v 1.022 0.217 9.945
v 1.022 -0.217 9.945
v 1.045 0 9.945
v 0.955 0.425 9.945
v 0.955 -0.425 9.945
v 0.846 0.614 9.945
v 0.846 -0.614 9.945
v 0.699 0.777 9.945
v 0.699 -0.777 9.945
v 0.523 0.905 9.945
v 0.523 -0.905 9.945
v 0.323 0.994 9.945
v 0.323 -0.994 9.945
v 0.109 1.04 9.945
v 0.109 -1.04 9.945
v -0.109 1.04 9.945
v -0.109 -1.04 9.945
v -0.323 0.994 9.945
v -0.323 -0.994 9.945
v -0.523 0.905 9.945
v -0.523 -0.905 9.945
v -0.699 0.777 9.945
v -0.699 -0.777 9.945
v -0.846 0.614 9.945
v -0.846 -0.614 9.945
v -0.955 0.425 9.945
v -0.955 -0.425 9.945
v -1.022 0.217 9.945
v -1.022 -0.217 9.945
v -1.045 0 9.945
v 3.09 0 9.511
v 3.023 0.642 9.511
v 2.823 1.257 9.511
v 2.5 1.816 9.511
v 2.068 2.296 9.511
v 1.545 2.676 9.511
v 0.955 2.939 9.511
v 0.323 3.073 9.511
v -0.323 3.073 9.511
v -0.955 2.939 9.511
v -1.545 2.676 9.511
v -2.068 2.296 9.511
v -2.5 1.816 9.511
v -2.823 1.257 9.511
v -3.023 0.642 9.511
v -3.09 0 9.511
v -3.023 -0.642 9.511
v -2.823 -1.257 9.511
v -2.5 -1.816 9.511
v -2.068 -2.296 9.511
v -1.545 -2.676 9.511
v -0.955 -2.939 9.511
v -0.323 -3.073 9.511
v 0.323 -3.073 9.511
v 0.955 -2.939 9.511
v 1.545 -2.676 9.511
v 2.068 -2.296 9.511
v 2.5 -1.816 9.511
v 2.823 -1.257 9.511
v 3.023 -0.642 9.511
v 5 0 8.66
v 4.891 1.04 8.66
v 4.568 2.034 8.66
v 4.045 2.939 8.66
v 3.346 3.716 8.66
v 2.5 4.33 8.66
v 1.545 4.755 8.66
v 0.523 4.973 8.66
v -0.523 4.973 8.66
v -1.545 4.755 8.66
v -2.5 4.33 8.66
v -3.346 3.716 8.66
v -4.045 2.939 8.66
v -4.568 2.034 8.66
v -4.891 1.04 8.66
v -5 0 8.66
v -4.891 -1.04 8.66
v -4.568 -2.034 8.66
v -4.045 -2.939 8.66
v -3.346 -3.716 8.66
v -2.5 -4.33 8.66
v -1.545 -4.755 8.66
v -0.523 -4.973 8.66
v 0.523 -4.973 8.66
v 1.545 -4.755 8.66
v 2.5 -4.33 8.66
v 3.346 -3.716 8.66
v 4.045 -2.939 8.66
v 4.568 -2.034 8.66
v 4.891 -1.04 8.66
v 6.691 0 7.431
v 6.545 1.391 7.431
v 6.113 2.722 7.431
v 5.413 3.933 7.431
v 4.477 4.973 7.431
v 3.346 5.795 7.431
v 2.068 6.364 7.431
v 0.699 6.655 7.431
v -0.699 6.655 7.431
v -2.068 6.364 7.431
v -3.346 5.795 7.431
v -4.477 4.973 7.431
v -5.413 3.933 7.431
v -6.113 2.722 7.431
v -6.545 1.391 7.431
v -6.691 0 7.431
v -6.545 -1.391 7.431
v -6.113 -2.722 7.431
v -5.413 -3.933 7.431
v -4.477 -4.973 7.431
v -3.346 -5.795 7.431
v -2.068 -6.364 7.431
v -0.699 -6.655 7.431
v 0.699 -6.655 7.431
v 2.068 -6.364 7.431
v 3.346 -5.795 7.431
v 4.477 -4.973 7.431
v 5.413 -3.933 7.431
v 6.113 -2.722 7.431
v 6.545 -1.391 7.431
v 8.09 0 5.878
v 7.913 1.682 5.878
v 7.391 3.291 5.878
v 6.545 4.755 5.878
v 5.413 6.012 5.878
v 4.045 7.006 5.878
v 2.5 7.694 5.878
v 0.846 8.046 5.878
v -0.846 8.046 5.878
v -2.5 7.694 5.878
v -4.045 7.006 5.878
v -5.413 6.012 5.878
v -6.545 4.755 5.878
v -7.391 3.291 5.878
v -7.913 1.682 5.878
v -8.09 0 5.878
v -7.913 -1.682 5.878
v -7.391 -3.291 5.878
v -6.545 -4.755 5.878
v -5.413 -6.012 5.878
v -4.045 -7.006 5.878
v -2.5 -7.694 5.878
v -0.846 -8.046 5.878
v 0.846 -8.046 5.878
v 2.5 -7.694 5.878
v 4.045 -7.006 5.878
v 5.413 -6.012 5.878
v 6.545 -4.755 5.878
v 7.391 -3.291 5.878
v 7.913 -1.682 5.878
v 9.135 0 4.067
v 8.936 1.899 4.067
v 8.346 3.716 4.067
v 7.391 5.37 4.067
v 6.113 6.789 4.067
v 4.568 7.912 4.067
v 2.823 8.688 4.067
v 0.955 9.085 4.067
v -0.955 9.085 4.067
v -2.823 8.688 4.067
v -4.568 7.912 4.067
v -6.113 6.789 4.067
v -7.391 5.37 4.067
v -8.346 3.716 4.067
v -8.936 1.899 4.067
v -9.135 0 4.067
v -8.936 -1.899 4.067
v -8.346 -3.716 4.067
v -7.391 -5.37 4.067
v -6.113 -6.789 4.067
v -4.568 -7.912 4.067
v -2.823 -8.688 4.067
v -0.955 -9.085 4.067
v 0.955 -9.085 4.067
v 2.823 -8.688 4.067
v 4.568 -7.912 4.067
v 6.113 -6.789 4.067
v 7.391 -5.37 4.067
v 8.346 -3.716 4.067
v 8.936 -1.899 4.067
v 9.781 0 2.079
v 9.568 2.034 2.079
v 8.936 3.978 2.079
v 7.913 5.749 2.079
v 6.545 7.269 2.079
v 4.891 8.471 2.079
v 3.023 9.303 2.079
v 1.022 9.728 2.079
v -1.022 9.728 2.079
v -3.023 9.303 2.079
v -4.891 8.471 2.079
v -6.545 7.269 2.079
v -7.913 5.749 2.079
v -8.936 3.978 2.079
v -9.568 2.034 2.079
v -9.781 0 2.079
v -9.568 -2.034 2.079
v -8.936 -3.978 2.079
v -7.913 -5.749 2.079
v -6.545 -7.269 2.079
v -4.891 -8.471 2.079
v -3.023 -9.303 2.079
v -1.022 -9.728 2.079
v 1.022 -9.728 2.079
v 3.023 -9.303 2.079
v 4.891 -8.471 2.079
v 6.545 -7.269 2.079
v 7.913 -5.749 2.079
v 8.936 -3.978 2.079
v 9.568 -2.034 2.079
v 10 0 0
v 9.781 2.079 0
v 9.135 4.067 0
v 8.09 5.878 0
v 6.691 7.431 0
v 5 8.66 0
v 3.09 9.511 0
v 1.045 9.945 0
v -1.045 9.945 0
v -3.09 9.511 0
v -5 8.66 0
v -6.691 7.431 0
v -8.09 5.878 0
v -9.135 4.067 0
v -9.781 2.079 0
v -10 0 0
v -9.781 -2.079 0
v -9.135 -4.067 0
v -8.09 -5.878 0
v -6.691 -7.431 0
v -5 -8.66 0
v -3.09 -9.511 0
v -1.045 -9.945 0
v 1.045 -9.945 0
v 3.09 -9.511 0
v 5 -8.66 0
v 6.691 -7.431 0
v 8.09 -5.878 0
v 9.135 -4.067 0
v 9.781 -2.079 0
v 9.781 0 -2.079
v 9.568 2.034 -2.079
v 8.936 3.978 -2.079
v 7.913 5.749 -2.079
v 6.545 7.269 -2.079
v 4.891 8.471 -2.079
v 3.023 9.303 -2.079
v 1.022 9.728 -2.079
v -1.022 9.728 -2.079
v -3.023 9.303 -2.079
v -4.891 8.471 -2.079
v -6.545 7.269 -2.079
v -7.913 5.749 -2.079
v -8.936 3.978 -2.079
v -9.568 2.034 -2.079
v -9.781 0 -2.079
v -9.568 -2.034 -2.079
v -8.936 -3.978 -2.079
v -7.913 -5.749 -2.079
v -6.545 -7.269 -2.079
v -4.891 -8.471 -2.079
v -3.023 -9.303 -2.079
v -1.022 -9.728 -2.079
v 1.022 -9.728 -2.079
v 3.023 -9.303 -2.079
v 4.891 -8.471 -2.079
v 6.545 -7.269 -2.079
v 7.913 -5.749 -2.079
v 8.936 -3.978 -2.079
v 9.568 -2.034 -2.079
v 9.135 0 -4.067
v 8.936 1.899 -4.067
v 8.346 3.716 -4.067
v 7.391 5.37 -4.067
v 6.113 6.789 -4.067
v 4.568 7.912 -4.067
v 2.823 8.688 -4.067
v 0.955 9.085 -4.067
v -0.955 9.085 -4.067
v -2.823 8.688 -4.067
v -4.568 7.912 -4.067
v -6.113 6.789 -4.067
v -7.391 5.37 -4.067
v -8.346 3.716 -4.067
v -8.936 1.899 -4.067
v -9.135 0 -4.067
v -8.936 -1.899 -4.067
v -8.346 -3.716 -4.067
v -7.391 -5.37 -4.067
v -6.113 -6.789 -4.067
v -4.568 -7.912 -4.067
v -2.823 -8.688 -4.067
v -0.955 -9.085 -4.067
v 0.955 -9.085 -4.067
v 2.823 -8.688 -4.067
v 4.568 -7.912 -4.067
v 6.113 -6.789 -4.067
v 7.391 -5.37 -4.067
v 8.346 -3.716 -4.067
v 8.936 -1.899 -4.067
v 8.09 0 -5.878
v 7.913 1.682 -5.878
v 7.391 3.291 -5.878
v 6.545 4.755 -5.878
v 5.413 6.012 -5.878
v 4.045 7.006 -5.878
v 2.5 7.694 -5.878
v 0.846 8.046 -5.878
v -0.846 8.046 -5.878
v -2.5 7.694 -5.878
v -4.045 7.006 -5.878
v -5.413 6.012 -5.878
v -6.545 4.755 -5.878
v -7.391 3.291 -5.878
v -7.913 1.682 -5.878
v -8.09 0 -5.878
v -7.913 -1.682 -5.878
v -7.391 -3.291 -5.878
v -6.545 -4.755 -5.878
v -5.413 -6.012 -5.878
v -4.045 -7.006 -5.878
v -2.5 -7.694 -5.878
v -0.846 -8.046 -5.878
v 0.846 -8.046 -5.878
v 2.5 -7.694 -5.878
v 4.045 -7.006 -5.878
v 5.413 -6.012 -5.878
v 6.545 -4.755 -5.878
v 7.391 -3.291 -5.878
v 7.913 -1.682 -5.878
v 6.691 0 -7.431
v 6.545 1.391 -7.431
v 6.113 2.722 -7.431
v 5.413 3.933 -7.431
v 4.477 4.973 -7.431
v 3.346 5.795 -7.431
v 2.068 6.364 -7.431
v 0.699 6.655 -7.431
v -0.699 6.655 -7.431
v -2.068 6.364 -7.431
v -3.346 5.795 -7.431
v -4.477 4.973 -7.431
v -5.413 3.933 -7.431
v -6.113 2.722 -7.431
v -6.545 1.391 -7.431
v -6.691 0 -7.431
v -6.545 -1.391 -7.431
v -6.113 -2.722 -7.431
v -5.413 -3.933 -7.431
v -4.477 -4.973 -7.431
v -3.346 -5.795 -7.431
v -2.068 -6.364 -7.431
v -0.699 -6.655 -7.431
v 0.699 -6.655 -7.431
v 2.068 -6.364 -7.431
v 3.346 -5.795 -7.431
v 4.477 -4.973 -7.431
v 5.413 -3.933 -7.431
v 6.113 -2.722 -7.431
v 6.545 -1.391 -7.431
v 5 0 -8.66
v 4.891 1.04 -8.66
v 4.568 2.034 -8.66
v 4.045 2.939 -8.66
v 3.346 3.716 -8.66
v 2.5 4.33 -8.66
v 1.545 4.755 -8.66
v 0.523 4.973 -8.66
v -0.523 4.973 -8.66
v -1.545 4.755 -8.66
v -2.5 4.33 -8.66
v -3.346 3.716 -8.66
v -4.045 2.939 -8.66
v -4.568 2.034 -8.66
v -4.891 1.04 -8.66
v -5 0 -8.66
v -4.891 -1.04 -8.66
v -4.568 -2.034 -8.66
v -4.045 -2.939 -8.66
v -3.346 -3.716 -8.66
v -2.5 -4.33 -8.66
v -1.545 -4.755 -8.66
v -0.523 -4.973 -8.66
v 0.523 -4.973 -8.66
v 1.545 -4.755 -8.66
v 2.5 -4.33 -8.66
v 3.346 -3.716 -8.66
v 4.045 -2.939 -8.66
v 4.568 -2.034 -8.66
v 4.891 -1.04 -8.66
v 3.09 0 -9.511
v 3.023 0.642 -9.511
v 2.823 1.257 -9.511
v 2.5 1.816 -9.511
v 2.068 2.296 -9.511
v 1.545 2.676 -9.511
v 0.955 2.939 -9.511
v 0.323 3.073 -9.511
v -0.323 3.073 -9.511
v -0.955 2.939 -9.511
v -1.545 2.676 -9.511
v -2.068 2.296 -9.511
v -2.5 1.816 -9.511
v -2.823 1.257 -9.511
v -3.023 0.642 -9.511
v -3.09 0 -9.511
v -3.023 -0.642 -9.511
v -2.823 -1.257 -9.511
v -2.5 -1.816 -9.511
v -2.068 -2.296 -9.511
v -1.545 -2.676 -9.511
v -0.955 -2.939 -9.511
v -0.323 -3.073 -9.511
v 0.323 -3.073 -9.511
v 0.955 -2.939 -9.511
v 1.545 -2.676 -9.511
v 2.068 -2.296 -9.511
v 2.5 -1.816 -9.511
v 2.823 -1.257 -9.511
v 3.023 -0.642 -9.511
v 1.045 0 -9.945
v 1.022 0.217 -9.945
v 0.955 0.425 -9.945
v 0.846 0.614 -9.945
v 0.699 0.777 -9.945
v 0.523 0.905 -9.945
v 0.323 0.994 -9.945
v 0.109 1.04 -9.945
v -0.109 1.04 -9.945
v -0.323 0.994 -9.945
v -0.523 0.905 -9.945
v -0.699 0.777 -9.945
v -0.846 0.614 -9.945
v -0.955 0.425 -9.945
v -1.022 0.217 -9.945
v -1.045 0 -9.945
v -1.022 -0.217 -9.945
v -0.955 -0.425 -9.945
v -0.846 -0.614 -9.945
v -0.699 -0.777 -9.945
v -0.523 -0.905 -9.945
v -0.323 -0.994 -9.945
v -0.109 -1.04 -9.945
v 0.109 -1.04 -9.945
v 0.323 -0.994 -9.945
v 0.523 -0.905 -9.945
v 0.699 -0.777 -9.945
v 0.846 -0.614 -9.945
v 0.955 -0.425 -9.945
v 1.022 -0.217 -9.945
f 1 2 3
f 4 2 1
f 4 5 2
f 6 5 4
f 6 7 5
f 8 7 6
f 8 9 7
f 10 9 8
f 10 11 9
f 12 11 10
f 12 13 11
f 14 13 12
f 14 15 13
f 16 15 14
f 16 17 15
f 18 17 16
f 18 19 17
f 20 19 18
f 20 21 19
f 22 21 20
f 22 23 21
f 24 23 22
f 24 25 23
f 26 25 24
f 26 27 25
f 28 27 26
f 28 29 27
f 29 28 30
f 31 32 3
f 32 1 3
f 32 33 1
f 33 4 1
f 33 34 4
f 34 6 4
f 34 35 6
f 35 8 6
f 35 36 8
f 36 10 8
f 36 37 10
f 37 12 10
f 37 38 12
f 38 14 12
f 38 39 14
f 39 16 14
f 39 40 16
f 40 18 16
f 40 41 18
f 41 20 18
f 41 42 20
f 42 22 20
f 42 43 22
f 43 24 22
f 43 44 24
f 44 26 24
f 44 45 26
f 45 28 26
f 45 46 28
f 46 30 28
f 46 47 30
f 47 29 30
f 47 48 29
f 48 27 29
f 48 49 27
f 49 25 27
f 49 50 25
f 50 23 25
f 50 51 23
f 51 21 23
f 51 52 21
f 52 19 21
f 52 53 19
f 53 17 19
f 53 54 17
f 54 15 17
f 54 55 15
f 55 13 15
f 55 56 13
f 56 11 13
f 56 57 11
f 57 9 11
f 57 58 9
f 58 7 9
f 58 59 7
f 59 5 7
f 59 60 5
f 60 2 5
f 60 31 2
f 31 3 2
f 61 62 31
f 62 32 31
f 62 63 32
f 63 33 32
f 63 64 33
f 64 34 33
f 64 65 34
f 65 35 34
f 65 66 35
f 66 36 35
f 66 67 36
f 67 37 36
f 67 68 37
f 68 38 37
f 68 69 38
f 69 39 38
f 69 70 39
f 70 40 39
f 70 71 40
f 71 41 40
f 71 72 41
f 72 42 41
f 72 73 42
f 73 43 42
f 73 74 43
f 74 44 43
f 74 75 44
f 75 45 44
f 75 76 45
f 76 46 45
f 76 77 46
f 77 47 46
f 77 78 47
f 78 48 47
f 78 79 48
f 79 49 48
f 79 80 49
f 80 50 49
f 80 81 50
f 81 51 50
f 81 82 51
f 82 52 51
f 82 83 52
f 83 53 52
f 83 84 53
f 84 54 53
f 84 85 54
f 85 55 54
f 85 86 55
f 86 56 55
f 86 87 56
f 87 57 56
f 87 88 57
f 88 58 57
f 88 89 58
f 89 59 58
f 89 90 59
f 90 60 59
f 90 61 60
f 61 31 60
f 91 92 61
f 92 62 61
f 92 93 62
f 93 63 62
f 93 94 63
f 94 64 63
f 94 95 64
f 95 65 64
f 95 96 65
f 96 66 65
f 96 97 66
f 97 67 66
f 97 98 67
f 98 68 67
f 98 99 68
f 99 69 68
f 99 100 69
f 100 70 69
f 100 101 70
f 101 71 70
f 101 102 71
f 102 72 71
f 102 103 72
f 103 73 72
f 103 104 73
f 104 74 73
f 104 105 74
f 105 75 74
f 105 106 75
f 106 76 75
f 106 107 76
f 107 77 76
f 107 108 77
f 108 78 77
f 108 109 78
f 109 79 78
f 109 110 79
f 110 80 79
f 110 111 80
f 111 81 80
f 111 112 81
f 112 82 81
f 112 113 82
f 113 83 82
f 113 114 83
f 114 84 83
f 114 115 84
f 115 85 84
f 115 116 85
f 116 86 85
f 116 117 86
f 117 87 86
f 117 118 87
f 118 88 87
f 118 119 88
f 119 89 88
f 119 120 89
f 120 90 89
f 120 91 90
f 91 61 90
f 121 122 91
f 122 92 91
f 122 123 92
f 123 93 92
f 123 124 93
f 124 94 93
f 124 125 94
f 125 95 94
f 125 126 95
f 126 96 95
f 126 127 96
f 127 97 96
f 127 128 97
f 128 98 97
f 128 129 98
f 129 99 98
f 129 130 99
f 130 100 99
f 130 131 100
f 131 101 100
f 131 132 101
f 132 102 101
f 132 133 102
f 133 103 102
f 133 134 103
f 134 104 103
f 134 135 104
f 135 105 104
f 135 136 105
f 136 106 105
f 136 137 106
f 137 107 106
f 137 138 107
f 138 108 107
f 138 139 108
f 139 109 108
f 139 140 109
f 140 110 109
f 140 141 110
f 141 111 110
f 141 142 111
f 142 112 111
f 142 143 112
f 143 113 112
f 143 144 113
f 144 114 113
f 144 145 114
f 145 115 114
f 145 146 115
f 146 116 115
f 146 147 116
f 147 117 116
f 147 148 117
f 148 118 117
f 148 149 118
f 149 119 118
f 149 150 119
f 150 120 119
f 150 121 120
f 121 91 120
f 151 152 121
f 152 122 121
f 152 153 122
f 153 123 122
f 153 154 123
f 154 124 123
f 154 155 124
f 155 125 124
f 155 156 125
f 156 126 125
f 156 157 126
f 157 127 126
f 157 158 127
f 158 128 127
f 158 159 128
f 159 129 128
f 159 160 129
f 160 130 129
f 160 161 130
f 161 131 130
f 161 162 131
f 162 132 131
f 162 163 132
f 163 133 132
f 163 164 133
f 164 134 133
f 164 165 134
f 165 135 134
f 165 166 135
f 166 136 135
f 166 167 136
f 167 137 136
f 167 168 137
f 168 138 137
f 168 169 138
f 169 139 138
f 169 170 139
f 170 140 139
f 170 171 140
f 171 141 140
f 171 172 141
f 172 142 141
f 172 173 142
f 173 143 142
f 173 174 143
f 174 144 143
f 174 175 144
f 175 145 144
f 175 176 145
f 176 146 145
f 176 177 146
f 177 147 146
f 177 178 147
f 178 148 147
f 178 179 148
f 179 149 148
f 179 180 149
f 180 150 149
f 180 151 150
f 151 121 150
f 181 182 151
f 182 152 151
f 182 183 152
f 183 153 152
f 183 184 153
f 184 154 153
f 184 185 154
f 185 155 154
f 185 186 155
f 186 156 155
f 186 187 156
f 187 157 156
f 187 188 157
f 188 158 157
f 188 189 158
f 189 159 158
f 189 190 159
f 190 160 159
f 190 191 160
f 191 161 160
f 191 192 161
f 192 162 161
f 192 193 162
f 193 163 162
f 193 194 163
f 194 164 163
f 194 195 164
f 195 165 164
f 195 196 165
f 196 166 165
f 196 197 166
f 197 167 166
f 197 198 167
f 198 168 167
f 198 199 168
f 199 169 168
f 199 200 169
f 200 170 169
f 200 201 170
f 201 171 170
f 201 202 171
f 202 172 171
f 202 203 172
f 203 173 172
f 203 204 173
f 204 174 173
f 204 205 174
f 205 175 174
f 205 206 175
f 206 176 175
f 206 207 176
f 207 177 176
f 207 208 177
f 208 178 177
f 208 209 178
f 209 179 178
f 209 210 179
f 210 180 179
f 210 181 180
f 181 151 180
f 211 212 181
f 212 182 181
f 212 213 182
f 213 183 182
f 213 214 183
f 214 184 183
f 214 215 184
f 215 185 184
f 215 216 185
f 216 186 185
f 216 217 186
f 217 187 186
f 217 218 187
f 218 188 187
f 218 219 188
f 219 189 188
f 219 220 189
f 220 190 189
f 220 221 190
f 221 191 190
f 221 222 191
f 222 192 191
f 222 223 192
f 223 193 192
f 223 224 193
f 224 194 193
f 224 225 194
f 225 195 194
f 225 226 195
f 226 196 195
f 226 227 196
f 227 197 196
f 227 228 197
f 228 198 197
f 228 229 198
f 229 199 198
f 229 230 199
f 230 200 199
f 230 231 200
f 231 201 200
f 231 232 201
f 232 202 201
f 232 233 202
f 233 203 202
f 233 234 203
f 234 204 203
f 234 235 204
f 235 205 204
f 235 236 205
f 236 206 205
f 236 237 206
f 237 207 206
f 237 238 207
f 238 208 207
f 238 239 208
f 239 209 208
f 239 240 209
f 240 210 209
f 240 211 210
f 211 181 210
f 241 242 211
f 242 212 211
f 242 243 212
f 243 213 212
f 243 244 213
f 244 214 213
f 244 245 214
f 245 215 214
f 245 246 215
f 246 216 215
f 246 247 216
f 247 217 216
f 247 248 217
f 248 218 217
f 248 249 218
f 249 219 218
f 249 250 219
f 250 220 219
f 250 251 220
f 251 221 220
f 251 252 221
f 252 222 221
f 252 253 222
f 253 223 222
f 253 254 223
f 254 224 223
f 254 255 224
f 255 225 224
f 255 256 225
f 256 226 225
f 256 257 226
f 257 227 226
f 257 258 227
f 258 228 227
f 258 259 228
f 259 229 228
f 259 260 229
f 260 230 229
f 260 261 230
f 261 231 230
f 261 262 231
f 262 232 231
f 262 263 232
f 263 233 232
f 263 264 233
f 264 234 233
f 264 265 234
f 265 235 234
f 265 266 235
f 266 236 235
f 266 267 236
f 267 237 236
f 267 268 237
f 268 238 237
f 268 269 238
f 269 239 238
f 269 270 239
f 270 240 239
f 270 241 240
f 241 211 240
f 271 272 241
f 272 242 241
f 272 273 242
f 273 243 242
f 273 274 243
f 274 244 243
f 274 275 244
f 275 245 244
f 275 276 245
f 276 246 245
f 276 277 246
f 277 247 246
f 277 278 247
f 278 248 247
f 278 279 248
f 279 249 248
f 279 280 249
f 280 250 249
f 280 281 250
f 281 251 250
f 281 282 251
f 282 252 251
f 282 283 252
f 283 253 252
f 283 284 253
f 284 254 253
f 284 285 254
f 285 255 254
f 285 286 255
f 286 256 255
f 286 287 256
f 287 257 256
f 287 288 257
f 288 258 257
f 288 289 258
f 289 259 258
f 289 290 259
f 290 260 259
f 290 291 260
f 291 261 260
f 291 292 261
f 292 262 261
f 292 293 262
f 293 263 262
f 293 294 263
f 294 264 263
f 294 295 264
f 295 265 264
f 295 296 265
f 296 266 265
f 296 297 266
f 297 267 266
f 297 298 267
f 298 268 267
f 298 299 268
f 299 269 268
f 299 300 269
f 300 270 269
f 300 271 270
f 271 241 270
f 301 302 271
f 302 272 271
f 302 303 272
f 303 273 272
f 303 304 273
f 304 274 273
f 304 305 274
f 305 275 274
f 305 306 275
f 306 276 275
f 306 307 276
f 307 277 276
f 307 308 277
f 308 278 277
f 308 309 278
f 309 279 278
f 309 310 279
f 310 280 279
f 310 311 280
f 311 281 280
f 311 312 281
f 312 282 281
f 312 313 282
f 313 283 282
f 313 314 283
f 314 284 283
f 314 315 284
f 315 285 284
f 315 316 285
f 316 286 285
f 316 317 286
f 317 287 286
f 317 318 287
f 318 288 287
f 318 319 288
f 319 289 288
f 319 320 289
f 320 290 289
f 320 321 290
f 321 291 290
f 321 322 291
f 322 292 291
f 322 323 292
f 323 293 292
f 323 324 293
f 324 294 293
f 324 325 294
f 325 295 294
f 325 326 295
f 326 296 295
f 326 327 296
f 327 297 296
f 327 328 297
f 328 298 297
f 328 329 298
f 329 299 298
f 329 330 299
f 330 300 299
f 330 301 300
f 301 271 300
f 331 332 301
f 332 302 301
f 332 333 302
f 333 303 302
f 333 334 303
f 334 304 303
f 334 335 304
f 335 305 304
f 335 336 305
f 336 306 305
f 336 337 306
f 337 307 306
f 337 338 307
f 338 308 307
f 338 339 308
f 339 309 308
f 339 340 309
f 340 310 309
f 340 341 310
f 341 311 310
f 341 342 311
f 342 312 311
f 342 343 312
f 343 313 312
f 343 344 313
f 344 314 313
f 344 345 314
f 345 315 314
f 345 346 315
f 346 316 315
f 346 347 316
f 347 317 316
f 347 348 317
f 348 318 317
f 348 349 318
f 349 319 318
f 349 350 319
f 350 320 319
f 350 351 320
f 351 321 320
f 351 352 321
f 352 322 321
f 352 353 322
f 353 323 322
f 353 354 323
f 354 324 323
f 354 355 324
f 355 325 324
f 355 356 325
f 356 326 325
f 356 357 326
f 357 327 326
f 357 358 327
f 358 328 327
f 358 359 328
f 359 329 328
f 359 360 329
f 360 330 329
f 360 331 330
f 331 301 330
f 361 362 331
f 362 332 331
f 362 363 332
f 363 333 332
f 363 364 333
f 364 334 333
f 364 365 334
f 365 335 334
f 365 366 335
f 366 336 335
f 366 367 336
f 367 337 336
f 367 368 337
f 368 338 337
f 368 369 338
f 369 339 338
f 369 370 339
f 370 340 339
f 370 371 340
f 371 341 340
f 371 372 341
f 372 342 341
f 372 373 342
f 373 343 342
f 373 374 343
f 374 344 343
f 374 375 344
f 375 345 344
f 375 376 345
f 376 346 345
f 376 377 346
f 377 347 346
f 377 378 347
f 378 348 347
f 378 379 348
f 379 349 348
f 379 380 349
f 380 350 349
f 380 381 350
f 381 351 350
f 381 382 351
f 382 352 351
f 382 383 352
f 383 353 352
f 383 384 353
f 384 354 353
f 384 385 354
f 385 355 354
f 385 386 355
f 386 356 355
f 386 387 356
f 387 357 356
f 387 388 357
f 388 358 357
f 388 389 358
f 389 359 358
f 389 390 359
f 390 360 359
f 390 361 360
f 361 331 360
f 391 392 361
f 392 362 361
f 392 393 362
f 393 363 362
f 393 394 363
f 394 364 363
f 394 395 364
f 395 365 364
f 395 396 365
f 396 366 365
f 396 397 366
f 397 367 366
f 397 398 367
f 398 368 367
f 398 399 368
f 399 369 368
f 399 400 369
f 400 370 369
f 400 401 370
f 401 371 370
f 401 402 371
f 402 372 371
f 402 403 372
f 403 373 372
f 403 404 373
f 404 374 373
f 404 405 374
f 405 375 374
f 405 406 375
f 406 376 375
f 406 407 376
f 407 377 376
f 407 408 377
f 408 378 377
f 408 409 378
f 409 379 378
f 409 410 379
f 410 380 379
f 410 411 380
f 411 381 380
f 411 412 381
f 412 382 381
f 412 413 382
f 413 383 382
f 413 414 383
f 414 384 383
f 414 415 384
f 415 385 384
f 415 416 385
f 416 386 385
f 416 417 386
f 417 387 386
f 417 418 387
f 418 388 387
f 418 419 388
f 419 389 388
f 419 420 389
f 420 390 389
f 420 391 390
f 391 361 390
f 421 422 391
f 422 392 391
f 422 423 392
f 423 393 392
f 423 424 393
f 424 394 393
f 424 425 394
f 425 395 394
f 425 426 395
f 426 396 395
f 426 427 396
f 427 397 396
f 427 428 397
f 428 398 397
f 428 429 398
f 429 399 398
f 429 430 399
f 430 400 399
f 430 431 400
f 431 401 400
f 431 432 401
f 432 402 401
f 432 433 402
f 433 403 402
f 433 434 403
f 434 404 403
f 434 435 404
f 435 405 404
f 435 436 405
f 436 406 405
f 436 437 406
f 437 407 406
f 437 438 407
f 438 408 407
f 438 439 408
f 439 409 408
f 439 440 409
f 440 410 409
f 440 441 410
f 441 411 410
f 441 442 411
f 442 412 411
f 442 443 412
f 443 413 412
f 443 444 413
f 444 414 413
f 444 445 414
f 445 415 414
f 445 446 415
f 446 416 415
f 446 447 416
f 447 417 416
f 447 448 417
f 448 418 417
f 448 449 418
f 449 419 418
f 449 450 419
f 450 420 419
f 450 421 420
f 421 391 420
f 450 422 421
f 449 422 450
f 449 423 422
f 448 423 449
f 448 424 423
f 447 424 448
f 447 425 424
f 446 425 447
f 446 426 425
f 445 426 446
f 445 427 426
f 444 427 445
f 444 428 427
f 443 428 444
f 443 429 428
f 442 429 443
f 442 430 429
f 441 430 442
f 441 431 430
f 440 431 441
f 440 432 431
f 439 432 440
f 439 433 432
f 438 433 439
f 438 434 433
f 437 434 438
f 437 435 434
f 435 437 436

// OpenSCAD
// Basic Building Blocks

// $fn = 100;

//sphere(10);

//sphere(r = 10);

//sphere(d = 10);

//sphere(r=10, d=10);

//sphere(d=10, r=10);

radius_with_a_name = 10;
sphere(r = radius_with_a_name);
